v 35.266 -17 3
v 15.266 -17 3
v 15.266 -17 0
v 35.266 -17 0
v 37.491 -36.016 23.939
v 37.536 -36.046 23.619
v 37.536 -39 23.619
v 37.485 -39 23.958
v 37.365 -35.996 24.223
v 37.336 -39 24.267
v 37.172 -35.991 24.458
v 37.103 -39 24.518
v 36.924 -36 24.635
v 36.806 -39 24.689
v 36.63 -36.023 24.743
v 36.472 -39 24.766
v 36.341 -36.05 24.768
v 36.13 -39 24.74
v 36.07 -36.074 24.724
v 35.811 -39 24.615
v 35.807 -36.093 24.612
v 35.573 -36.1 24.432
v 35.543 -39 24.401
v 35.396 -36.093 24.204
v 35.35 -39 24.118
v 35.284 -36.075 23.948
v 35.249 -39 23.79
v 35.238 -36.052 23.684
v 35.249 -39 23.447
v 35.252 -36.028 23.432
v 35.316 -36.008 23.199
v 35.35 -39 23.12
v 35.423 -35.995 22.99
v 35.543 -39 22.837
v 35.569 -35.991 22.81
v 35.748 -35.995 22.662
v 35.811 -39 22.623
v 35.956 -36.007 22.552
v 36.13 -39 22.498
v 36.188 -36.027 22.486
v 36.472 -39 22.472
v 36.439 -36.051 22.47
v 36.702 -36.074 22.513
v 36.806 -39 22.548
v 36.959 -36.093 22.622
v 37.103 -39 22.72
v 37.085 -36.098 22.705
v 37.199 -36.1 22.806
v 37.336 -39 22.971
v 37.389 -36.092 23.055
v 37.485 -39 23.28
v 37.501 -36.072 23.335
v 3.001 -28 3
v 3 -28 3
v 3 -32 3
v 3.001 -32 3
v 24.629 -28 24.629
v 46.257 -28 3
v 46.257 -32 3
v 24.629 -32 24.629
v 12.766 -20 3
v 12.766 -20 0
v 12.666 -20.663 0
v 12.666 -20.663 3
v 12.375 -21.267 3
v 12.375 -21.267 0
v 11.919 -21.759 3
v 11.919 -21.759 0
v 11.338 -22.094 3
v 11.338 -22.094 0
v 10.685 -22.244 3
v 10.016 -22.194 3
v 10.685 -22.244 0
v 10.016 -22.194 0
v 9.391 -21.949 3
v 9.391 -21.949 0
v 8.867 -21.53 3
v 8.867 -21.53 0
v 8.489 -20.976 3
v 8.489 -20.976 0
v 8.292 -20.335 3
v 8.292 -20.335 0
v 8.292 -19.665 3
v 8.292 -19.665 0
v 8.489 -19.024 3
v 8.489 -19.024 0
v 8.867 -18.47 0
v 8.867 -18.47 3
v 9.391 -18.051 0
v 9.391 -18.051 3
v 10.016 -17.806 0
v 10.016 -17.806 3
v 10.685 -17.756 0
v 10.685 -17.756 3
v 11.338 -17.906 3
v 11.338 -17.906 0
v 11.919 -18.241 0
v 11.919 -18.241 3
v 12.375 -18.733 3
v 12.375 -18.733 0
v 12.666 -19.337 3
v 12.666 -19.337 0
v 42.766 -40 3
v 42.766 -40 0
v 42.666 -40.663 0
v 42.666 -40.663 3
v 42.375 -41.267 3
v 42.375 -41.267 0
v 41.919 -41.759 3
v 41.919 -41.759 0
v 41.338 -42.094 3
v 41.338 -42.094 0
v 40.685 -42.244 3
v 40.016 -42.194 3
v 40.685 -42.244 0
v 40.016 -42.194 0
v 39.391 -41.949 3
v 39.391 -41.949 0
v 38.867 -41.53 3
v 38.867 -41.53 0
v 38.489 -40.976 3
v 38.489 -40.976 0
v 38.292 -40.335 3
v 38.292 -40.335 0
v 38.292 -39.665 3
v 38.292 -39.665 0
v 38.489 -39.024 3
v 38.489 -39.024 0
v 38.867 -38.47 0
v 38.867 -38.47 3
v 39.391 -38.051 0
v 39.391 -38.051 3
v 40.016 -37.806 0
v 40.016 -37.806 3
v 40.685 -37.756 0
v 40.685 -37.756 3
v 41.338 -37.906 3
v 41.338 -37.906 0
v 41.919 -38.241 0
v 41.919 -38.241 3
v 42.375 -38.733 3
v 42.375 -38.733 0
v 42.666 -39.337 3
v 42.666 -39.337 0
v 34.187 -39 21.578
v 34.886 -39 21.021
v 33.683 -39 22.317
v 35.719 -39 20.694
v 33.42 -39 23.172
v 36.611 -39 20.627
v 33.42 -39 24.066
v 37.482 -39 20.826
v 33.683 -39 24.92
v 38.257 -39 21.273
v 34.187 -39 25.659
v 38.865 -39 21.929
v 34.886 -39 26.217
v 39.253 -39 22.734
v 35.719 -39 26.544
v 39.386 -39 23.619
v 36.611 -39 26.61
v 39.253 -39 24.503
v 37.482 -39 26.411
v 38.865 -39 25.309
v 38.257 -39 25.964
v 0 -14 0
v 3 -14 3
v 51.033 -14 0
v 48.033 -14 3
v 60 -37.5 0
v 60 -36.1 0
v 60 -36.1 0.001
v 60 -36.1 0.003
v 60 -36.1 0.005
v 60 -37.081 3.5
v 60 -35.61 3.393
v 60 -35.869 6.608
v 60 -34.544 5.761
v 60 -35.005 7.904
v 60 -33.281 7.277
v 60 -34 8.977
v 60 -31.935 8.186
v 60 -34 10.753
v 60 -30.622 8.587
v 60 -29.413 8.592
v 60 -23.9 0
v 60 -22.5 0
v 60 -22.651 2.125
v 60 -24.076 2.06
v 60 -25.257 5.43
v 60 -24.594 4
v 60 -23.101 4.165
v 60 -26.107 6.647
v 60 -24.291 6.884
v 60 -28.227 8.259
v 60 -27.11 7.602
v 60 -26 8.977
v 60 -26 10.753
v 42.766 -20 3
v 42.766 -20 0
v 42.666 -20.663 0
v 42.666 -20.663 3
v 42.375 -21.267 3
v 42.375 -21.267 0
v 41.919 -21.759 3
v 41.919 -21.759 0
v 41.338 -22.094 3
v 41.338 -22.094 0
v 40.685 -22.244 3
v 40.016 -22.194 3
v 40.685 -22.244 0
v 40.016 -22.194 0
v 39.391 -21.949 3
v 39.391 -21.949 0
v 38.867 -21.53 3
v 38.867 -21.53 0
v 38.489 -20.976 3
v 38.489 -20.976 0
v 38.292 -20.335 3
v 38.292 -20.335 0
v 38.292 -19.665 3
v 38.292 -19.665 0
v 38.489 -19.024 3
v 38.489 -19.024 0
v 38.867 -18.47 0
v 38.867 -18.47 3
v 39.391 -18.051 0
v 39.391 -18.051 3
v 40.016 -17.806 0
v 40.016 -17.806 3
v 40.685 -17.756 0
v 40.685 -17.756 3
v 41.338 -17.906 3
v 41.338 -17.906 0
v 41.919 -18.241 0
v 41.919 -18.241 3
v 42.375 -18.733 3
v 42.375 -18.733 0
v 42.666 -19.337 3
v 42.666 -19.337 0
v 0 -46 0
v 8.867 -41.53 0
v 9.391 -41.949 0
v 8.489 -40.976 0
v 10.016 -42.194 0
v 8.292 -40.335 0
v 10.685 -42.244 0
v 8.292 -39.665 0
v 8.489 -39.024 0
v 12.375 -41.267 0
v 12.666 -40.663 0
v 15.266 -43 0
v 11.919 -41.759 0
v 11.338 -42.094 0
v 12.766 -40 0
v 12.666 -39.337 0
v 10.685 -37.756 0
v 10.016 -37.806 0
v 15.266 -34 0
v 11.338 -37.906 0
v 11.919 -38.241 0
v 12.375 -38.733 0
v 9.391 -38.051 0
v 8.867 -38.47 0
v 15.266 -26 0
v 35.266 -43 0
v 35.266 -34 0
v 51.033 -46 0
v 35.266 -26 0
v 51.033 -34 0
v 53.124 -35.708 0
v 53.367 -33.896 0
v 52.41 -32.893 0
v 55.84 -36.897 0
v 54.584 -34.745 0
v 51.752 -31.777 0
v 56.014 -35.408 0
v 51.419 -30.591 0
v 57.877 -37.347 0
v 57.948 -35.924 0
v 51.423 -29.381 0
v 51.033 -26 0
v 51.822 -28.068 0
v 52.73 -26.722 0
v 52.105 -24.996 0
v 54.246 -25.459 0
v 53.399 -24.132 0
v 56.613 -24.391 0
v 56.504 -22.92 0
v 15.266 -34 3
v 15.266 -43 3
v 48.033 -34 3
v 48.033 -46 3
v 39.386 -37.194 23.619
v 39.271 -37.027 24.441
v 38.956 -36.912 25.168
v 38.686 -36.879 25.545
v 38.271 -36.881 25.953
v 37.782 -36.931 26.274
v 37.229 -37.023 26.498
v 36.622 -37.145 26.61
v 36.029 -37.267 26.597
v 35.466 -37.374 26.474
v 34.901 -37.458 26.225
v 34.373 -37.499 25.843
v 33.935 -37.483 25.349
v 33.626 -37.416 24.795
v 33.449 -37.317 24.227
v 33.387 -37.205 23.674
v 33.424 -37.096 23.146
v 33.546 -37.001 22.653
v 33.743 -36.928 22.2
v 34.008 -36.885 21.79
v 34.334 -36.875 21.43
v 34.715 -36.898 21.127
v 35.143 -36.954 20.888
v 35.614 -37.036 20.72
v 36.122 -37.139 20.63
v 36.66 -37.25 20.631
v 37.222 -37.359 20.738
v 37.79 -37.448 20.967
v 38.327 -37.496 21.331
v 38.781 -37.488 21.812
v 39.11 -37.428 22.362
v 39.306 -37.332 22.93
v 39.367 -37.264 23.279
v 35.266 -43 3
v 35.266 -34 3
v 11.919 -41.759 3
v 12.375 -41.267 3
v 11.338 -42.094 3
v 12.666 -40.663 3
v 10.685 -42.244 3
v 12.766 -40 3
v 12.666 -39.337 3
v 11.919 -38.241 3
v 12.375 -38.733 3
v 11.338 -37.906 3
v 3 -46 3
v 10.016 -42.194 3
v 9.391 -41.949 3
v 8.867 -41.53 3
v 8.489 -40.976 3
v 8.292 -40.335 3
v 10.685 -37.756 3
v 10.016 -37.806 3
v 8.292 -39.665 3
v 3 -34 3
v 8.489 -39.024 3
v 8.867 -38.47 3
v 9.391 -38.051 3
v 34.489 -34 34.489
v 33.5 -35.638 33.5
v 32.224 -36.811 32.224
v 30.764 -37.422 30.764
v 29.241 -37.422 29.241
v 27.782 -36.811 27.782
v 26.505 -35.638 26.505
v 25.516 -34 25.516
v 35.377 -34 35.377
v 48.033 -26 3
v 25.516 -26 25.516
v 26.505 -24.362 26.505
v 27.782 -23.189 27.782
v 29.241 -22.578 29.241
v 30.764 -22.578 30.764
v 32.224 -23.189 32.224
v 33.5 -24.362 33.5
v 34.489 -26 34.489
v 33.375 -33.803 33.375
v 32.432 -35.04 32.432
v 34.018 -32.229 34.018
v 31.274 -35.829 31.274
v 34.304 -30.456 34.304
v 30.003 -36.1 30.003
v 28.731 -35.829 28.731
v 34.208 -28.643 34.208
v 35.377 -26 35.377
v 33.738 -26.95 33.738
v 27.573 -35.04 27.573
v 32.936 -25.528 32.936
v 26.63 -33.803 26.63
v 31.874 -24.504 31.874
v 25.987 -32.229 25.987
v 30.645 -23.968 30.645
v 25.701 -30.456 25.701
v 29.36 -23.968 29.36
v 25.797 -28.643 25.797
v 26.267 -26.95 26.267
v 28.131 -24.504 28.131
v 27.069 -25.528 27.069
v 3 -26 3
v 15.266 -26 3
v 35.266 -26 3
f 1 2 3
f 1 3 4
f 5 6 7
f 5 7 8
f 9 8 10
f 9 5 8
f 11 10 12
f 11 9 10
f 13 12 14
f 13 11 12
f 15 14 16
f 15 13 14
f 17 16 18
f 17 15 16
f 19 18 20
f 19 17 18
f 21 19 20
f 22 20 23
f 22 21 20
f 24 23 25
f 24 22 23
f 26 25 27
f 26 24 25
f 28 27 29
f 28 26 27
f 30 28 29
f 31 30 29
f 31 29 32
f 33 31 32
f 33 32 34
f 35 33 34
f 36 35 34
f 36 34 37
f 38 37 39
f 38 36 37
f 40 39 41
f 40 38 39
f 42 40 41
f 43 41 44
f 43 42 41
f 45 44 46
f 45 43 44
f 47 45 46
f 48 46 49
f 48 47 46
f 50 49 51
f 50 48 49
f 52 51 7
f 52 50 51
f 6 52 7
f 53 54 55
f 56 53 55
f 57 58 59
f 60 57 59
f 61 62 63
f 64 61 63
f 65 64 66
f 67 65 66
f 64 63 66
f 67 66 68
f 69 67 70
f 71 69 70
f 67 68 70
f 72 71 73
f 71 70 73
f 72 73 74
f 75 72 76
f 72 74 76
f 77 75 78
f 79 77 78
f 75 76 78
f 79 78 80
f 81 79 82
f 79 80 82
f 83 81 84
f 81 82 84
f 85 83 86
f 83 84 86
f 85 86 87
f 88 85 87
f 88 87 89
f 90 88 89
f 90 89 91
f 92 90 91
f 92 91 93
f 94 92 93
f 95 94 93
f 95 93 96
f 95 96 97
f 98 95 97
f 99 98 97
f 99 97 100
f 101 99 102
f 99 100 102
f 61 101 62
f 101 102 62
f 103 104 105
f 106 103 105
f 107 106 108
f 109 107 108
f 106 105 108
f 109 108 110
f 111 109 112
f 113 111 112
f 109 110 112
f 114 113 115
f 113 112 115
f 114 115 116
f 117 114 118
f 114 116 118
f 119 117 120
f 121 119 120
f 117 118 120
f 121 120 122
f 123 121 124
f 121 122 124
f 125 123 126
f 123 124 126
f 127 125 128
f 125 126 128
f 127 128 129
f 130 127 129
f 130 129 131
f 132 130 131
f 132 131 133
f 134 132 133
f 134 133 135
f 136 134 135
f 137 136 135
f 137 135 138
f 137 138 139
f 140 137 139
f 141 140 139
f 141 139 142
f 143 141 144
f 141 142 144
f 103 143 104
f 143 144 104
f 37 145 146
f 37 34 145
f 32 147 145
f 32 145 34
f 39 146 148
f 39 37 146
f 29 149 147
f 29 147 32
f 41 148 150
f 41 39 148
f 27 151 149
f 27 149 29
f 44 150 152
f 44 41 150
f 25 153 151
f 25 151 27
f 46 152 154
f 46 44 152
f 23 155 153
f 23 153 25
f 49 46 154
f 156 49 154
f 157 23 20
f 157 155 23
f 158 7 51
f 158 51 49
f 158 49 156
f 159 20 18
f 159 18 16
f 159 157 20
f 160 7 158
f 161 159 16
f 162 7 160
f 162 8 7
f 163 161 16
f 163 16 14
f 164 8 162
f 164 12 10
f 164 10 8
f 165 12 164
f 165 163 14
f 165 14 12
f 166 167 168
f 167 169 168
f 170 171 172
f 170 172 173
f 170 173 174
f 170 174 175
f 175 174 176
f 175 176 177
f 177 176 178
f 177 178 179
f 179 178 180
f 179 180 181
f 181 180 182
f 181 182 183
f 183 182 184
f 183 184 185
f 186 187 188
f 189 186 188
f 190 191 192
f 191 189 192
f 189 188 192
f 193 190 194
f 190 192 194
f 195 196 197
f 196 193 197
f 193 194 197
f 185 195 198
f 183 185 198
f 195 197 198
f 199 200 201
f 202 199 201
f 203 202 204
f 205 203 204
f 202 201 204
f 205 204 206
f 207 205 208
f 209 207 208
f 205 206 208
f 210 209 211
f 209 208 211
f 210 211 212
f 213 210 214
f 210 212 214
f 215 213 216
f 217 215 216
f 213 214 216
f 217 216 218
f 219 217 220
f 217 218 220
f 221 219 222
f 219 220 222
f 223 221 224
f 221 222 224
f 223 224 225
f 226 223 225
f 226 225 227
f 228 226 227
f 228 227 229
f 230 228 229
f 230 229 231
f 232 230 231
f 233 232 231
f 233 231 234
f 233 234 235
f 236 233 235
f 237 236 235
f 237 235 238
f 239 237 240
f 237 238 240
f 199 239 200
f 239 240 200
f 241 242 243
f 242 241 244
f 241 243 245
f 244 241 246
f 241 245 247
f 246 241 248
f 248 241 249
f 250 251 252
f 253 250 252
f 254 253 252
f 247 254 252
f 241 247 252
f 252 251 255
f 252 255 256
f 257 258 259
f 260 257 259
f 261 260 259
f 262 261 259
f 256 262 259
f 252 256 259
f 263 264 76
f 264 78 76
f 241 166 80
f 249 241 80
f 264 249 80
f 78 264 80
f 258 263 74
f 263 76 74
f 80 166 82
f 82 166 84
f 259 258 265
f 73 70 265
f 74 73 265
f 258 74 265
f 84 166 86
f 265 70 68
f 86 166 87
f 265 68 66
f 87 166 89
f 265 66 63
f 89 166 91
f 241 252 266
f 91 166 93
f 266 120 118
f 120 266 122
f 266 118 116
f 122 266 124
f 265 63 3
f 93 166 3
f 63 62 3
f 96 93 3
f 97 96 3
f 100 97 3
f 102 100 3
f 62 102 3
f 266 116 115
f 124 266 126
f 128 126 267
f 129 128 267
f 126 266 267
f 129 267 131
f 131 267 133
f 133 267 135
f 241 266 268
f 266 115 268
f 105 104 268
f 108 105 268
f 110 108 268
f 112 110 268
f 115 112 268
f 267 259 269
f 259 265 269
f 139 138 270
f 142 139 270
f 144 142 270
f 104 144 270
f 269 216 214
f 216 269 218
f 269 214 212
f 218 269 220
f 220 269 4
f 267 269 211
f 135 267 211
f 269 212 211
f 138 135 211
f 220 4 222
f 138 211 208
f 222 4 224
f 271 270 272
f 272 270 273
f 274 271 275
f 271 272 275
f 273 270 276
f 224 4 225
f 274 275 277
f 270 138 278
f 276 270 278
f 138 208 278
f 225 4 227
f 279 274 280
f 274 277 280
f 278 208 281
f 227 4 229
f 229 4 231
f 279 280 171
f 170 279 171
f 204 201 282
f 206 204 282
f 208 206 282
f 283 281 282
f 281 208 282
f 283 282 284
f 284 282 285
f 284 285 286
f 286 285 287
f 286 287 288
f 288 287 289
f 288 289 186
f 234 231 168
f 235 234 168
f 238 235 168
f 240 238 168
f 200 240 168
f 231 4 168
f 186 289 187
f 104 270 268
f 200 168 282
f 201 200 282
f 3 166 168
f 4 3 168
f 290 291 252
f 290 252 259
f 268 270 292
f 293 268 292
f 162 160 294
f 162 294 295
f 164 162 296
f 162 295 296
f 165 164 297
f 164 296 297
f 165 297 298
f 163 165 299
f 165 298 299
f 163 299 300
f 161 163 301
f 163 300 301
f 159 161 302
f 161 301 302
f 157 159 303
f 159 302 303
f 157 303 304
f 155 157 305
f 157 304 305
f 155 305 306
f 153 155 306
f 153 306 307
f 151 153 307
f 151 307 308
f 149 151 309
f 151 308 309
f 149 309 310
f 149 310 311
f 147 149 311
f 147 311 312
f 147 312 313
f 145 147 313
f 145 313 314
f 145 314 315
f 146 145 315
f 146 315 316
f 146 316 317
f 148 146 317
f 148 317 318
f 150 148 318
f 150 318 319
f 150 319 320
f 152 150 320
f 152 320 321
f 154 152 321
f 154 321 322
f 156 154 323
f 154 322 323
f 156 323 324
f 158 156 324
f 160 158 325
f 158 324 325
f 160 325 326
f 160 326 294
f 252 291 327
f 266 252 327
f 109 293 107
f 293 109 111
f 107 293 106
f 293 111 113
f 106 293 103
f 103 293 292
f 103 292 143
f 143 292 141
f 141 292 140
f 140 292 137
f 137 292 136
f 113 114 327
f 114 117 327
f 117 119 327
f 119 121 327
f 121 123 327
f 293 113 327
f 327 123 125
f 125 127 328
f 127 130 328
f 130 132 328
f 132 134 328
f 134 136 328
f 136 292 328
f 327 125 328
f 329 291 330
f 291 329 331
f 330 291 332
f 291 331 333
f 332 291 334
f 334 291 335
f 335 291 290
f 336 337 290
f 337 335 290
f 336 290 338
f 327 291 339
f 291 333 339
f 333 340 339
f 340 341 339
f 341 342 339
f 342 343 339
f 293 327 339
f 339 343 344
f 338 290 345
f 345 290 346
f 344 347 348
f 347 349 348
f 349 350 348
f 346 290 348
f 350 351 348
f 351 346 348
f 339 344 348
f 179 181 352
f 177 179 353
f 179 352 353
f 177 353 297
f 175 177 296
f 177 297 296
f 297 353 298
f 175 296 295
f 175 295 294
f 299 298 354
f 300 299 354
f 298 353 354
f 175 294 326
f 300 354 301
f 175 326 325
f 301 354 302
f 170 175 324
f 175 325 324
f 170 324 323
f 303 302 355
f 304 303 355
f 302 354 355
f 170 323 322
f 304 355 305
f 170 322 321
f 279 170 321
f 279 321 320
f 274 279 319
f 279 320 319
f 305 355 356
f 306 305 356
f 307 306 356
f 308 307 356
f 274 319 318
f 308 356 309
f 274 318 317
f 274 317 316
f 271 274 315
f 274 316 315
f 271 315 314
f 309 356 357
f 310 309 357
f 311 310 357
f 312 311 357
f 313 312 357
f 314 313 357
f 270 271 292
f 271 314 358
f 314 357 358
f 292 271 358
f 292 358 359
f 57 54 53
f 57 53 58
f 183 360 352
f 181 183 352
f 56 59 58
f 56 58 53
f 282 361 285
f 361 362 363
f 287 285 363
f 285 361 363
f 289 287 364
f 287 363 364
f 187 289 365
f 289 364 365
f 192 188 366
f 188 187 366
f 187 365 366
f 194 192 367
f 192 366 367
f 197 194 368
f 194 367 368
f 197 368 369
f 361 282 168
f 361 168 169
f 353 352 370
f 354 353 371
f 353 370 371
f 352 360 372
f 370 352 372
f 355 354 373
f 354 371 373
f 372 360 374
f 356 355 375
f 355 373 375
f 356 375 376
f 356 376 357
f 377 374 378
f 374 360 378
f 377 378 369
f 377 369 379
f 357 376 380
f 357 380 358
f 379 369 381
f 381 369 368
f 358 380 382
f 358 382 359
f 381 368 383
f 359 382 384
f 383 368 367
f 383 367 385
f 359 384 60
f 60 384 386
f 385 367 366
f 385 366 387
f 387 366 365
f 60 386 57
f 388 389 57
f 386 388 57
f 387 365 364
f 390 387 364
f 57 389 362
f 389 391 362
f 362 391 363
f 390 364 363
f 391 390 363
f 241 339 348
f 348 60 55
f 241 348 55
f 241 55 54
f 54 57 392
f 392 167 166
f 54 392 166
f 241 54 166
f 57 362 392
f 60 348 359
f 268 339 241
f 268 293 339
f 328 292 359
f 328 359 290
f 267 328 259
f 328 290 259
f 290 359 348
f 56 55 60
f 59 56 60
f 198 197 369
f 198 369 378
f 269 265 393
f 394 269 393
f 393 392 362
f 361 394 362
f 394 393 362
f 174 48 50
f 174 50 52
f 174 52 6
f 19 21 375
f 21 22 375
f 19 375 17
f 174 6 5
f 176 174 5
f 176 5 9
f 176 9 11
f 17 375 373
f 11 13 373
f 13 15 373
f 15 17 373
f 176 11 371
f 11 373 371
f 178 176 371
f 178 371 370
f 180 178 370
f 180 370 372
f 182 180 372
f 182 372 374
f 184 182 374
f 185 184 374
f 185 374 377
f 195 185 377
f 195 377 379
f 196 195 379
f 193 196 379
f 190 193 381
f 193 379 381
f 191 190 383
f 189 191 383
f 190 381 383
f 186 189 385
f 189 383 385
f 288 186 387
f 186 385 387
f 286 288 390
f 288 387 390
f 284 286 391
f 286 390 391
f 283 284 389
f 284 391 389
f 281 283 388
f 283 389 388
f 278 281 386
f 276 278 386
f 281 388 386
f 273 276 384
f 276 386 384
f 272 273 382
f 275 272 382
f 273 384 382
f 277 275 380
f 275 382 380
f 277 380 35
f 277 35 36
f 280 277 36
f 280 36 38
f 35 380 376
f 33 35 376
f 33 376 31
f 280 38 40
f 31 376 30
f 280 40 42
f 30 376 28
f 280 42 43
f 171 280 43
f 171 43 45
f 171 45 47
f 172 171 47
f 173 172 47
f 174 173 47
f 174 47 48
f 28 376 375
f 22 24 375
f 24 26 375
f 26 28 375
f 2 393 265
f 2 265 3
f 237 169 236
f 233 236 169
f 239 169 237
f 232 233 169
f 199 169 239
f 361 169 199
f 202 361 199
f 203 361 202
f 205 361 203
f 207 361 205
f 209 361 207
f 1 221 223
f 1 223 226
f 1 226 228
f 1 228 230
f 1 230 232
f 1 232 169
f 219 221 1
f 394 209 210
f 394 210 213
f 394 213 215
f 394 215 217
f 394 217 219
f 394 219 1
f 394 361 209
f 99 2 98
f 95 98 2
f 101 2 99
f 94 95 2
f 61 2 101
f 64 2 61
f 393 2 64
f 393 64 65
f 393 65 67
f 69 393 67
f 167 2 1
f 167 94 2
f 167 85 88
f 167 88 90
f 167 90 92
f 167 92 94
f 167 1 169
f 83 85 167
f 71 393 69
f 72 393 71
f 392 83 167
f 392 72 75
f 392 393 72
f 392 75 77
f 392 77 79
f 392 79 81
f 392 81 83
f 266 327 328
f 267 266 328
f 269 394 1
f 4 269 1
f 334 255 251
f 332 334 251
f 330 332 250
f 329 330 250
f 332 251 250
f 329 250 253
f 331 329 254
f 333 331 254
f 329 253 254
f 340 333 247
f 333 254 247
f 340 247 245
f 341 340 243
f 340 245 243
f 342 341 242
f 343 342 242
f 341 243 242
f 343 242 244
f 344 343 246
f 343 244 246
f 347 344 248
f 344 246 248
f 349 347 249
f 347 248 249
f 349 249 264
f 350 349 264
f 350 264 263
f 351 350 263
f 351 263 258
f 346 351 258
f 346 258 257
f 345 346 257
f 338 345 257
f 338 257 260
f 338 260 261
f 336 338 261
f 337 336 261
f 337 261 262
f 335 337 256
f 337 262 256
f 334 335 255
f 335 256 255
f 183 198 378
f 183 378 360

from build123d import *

# Parameters (mm, degrees)
F1_DEPTH  = 60
F3_DEPTH  = 42.4274068712
F4_R      = 3
F5_DEPTH  = 5
F6_R      = 6.1
F7_DEPTH  = 42.4274068712
F8_W      = 4
F8_H      = 30.587
F8_W_2    = 8
F8_H_2    = 34.8228137424
F9_DEPTH  = 34.831
F11_DEPTH = 12
F12_DEPTH = 20
F13_R     = 2.25
F14_DEPTH = 3
F15_W     = 20
F15_H     = 9
F16_DEPTH = 3
F17_R     = 1.15
F18_DEPTH = 25


with BuildPart() as f1:
    # F0 (on Front) → F1 (new body)
    with BuildSketch(Plane.XZ):
        Polygon((60, 60), (0, 0), (60, 0), align=None)
    extrude(amount=F1_DEPTH)

    # F2 (on face) → F3 (cut, through all)
    with BuildSketch(Plane(origin=(0, 0, 0), x_dir=(0, -1, 0), z_dir=(-0.7071067812, 0, 0.7071067812))):
        with BuildLine():
            Line((0, 84.8528137424), (0, 0))
            Line((0, 0), (26, 0))
            Line((26, 0), (26, 36.0857112298))
            ThreePointArc((26, 36.0857112298), (22.5, 42.43), (26, 48.7742887702))
            Line((26, 48.7742887702), (26, 84.8528137424))
            Line((26, 84.8528137424), (0, 84.8528137424))
        make_face()
        with BuildLine():
            Line((34, 84.8528137424), (34, 48.7742887702))
            ThreePointArc((34, 48.7742887702), (37.5, 42.43), (34, 36.0857112298))
            Line((34, 36.0857112298), (34, 0))
            Line((34, 0), (60, 0))
            Line((60, 0), (60, 84.8528137424))
            Line((60, 84.8528137424), (34, 84.8528137424))
        make_face()
    extrude(amount=-F3_DEPTH, mode=Mode.SUBTRACT)

    # F4 (on face) → F5 (join)
    with BuildSketch(Plane.XZ.offset(34)):
        with Locations((36.3863177288, 23.6187637227)):
            Circle(F4_R)
    extrude(amount=F5_DEPTH)

    # F6 (on face) → F7 (cut, through all)
    with BuildSketch(Plane(origin=(0, 0, 0), x_dir=(0, -1, 0), z_dir=(-0.7071067812, 0, 0.7071067812))):
        with Locations((30, 42.43)):
            Circle(F6_R)
    extrude(amount=-F7_DEPTH, mode=Mode.SUBTRACT)

    # F8 (on face) → F9 (cut, through all)
    with BuildSketch(Plane(origin=(0, 0, 0), x_dir=(0, -1, 0), z_dir=(-0.7071067812, 0, 0.7071067812))):
        with Locations((30, 19.5365)):
            Rectangle(F8_W, F8_H)
        with Locations((30, 67.4414068712)):
            Rectangle(F8_W_2, F8_H_2)
    extrude(amount=-F9_DEPTH, mode=Mode.SUBTRACT)

    # F10 (on face) → F11 (join)
    with BuildSketch(Plane.XZ.offset(34)):
        Polygon((3, 3), (0, 0), (51.032902229, 0), (48.032902229, 3), align=None)
    extrude(amount=F11_DEPTH)

    # F10 (on face) → F12 (join)
    with BuildSketch(Plane.XZ.offset(34)):
        Polygon((3, 3), (0, 0), (51.032902229, 0), (48.032902229, 3), align=None)
    extrude(amount=-F12_DEPTH)

    # F13 (on face) → F14 (cut, through all)
    with BuildSketch(Plane(origin=(0, 0, 0), x_dir=(1, 0, 0), z_dir=(0, 0, -1))):
        with Locations((10.5164511145, 40)):
            Circle(F13_R)
        with Locations((40.5164511145, 40)):
            Circle(F13_R)
        with Locations((40.5164511145, 20)):
            Circle(F13_R)
        with Locations((10.5164511145, 20)):
            Circle(F13_R)
    extrude(amount=-F14_DEPTH, mode=Mode.SUBTRACT)

    # F15 (on face) → F16 (cut, through all)
    with BuildSketch(Plane.XY.offset(3)):
        with Locations((25.2664511145, -21.5)):
            Rectangle(F15_W, F15_H)
        with Locations((25.2664511145, -38.5)):
            Rectangle(F15_W, F15_H)
    extrude(amount=-F16_DEPTH, mode=Mode.SUBTRACT)

    # F17 (on face) → F18 (cut)
    with BuildSketch(Plane.XZ.offset(34)):
        with Locations((36.3863177288, 23.6187637227)):
            Circle(F17_R)
    extrude(amount=F18_DEPTH, mode=Mode.SUBTRACT)


solid = f1.part
